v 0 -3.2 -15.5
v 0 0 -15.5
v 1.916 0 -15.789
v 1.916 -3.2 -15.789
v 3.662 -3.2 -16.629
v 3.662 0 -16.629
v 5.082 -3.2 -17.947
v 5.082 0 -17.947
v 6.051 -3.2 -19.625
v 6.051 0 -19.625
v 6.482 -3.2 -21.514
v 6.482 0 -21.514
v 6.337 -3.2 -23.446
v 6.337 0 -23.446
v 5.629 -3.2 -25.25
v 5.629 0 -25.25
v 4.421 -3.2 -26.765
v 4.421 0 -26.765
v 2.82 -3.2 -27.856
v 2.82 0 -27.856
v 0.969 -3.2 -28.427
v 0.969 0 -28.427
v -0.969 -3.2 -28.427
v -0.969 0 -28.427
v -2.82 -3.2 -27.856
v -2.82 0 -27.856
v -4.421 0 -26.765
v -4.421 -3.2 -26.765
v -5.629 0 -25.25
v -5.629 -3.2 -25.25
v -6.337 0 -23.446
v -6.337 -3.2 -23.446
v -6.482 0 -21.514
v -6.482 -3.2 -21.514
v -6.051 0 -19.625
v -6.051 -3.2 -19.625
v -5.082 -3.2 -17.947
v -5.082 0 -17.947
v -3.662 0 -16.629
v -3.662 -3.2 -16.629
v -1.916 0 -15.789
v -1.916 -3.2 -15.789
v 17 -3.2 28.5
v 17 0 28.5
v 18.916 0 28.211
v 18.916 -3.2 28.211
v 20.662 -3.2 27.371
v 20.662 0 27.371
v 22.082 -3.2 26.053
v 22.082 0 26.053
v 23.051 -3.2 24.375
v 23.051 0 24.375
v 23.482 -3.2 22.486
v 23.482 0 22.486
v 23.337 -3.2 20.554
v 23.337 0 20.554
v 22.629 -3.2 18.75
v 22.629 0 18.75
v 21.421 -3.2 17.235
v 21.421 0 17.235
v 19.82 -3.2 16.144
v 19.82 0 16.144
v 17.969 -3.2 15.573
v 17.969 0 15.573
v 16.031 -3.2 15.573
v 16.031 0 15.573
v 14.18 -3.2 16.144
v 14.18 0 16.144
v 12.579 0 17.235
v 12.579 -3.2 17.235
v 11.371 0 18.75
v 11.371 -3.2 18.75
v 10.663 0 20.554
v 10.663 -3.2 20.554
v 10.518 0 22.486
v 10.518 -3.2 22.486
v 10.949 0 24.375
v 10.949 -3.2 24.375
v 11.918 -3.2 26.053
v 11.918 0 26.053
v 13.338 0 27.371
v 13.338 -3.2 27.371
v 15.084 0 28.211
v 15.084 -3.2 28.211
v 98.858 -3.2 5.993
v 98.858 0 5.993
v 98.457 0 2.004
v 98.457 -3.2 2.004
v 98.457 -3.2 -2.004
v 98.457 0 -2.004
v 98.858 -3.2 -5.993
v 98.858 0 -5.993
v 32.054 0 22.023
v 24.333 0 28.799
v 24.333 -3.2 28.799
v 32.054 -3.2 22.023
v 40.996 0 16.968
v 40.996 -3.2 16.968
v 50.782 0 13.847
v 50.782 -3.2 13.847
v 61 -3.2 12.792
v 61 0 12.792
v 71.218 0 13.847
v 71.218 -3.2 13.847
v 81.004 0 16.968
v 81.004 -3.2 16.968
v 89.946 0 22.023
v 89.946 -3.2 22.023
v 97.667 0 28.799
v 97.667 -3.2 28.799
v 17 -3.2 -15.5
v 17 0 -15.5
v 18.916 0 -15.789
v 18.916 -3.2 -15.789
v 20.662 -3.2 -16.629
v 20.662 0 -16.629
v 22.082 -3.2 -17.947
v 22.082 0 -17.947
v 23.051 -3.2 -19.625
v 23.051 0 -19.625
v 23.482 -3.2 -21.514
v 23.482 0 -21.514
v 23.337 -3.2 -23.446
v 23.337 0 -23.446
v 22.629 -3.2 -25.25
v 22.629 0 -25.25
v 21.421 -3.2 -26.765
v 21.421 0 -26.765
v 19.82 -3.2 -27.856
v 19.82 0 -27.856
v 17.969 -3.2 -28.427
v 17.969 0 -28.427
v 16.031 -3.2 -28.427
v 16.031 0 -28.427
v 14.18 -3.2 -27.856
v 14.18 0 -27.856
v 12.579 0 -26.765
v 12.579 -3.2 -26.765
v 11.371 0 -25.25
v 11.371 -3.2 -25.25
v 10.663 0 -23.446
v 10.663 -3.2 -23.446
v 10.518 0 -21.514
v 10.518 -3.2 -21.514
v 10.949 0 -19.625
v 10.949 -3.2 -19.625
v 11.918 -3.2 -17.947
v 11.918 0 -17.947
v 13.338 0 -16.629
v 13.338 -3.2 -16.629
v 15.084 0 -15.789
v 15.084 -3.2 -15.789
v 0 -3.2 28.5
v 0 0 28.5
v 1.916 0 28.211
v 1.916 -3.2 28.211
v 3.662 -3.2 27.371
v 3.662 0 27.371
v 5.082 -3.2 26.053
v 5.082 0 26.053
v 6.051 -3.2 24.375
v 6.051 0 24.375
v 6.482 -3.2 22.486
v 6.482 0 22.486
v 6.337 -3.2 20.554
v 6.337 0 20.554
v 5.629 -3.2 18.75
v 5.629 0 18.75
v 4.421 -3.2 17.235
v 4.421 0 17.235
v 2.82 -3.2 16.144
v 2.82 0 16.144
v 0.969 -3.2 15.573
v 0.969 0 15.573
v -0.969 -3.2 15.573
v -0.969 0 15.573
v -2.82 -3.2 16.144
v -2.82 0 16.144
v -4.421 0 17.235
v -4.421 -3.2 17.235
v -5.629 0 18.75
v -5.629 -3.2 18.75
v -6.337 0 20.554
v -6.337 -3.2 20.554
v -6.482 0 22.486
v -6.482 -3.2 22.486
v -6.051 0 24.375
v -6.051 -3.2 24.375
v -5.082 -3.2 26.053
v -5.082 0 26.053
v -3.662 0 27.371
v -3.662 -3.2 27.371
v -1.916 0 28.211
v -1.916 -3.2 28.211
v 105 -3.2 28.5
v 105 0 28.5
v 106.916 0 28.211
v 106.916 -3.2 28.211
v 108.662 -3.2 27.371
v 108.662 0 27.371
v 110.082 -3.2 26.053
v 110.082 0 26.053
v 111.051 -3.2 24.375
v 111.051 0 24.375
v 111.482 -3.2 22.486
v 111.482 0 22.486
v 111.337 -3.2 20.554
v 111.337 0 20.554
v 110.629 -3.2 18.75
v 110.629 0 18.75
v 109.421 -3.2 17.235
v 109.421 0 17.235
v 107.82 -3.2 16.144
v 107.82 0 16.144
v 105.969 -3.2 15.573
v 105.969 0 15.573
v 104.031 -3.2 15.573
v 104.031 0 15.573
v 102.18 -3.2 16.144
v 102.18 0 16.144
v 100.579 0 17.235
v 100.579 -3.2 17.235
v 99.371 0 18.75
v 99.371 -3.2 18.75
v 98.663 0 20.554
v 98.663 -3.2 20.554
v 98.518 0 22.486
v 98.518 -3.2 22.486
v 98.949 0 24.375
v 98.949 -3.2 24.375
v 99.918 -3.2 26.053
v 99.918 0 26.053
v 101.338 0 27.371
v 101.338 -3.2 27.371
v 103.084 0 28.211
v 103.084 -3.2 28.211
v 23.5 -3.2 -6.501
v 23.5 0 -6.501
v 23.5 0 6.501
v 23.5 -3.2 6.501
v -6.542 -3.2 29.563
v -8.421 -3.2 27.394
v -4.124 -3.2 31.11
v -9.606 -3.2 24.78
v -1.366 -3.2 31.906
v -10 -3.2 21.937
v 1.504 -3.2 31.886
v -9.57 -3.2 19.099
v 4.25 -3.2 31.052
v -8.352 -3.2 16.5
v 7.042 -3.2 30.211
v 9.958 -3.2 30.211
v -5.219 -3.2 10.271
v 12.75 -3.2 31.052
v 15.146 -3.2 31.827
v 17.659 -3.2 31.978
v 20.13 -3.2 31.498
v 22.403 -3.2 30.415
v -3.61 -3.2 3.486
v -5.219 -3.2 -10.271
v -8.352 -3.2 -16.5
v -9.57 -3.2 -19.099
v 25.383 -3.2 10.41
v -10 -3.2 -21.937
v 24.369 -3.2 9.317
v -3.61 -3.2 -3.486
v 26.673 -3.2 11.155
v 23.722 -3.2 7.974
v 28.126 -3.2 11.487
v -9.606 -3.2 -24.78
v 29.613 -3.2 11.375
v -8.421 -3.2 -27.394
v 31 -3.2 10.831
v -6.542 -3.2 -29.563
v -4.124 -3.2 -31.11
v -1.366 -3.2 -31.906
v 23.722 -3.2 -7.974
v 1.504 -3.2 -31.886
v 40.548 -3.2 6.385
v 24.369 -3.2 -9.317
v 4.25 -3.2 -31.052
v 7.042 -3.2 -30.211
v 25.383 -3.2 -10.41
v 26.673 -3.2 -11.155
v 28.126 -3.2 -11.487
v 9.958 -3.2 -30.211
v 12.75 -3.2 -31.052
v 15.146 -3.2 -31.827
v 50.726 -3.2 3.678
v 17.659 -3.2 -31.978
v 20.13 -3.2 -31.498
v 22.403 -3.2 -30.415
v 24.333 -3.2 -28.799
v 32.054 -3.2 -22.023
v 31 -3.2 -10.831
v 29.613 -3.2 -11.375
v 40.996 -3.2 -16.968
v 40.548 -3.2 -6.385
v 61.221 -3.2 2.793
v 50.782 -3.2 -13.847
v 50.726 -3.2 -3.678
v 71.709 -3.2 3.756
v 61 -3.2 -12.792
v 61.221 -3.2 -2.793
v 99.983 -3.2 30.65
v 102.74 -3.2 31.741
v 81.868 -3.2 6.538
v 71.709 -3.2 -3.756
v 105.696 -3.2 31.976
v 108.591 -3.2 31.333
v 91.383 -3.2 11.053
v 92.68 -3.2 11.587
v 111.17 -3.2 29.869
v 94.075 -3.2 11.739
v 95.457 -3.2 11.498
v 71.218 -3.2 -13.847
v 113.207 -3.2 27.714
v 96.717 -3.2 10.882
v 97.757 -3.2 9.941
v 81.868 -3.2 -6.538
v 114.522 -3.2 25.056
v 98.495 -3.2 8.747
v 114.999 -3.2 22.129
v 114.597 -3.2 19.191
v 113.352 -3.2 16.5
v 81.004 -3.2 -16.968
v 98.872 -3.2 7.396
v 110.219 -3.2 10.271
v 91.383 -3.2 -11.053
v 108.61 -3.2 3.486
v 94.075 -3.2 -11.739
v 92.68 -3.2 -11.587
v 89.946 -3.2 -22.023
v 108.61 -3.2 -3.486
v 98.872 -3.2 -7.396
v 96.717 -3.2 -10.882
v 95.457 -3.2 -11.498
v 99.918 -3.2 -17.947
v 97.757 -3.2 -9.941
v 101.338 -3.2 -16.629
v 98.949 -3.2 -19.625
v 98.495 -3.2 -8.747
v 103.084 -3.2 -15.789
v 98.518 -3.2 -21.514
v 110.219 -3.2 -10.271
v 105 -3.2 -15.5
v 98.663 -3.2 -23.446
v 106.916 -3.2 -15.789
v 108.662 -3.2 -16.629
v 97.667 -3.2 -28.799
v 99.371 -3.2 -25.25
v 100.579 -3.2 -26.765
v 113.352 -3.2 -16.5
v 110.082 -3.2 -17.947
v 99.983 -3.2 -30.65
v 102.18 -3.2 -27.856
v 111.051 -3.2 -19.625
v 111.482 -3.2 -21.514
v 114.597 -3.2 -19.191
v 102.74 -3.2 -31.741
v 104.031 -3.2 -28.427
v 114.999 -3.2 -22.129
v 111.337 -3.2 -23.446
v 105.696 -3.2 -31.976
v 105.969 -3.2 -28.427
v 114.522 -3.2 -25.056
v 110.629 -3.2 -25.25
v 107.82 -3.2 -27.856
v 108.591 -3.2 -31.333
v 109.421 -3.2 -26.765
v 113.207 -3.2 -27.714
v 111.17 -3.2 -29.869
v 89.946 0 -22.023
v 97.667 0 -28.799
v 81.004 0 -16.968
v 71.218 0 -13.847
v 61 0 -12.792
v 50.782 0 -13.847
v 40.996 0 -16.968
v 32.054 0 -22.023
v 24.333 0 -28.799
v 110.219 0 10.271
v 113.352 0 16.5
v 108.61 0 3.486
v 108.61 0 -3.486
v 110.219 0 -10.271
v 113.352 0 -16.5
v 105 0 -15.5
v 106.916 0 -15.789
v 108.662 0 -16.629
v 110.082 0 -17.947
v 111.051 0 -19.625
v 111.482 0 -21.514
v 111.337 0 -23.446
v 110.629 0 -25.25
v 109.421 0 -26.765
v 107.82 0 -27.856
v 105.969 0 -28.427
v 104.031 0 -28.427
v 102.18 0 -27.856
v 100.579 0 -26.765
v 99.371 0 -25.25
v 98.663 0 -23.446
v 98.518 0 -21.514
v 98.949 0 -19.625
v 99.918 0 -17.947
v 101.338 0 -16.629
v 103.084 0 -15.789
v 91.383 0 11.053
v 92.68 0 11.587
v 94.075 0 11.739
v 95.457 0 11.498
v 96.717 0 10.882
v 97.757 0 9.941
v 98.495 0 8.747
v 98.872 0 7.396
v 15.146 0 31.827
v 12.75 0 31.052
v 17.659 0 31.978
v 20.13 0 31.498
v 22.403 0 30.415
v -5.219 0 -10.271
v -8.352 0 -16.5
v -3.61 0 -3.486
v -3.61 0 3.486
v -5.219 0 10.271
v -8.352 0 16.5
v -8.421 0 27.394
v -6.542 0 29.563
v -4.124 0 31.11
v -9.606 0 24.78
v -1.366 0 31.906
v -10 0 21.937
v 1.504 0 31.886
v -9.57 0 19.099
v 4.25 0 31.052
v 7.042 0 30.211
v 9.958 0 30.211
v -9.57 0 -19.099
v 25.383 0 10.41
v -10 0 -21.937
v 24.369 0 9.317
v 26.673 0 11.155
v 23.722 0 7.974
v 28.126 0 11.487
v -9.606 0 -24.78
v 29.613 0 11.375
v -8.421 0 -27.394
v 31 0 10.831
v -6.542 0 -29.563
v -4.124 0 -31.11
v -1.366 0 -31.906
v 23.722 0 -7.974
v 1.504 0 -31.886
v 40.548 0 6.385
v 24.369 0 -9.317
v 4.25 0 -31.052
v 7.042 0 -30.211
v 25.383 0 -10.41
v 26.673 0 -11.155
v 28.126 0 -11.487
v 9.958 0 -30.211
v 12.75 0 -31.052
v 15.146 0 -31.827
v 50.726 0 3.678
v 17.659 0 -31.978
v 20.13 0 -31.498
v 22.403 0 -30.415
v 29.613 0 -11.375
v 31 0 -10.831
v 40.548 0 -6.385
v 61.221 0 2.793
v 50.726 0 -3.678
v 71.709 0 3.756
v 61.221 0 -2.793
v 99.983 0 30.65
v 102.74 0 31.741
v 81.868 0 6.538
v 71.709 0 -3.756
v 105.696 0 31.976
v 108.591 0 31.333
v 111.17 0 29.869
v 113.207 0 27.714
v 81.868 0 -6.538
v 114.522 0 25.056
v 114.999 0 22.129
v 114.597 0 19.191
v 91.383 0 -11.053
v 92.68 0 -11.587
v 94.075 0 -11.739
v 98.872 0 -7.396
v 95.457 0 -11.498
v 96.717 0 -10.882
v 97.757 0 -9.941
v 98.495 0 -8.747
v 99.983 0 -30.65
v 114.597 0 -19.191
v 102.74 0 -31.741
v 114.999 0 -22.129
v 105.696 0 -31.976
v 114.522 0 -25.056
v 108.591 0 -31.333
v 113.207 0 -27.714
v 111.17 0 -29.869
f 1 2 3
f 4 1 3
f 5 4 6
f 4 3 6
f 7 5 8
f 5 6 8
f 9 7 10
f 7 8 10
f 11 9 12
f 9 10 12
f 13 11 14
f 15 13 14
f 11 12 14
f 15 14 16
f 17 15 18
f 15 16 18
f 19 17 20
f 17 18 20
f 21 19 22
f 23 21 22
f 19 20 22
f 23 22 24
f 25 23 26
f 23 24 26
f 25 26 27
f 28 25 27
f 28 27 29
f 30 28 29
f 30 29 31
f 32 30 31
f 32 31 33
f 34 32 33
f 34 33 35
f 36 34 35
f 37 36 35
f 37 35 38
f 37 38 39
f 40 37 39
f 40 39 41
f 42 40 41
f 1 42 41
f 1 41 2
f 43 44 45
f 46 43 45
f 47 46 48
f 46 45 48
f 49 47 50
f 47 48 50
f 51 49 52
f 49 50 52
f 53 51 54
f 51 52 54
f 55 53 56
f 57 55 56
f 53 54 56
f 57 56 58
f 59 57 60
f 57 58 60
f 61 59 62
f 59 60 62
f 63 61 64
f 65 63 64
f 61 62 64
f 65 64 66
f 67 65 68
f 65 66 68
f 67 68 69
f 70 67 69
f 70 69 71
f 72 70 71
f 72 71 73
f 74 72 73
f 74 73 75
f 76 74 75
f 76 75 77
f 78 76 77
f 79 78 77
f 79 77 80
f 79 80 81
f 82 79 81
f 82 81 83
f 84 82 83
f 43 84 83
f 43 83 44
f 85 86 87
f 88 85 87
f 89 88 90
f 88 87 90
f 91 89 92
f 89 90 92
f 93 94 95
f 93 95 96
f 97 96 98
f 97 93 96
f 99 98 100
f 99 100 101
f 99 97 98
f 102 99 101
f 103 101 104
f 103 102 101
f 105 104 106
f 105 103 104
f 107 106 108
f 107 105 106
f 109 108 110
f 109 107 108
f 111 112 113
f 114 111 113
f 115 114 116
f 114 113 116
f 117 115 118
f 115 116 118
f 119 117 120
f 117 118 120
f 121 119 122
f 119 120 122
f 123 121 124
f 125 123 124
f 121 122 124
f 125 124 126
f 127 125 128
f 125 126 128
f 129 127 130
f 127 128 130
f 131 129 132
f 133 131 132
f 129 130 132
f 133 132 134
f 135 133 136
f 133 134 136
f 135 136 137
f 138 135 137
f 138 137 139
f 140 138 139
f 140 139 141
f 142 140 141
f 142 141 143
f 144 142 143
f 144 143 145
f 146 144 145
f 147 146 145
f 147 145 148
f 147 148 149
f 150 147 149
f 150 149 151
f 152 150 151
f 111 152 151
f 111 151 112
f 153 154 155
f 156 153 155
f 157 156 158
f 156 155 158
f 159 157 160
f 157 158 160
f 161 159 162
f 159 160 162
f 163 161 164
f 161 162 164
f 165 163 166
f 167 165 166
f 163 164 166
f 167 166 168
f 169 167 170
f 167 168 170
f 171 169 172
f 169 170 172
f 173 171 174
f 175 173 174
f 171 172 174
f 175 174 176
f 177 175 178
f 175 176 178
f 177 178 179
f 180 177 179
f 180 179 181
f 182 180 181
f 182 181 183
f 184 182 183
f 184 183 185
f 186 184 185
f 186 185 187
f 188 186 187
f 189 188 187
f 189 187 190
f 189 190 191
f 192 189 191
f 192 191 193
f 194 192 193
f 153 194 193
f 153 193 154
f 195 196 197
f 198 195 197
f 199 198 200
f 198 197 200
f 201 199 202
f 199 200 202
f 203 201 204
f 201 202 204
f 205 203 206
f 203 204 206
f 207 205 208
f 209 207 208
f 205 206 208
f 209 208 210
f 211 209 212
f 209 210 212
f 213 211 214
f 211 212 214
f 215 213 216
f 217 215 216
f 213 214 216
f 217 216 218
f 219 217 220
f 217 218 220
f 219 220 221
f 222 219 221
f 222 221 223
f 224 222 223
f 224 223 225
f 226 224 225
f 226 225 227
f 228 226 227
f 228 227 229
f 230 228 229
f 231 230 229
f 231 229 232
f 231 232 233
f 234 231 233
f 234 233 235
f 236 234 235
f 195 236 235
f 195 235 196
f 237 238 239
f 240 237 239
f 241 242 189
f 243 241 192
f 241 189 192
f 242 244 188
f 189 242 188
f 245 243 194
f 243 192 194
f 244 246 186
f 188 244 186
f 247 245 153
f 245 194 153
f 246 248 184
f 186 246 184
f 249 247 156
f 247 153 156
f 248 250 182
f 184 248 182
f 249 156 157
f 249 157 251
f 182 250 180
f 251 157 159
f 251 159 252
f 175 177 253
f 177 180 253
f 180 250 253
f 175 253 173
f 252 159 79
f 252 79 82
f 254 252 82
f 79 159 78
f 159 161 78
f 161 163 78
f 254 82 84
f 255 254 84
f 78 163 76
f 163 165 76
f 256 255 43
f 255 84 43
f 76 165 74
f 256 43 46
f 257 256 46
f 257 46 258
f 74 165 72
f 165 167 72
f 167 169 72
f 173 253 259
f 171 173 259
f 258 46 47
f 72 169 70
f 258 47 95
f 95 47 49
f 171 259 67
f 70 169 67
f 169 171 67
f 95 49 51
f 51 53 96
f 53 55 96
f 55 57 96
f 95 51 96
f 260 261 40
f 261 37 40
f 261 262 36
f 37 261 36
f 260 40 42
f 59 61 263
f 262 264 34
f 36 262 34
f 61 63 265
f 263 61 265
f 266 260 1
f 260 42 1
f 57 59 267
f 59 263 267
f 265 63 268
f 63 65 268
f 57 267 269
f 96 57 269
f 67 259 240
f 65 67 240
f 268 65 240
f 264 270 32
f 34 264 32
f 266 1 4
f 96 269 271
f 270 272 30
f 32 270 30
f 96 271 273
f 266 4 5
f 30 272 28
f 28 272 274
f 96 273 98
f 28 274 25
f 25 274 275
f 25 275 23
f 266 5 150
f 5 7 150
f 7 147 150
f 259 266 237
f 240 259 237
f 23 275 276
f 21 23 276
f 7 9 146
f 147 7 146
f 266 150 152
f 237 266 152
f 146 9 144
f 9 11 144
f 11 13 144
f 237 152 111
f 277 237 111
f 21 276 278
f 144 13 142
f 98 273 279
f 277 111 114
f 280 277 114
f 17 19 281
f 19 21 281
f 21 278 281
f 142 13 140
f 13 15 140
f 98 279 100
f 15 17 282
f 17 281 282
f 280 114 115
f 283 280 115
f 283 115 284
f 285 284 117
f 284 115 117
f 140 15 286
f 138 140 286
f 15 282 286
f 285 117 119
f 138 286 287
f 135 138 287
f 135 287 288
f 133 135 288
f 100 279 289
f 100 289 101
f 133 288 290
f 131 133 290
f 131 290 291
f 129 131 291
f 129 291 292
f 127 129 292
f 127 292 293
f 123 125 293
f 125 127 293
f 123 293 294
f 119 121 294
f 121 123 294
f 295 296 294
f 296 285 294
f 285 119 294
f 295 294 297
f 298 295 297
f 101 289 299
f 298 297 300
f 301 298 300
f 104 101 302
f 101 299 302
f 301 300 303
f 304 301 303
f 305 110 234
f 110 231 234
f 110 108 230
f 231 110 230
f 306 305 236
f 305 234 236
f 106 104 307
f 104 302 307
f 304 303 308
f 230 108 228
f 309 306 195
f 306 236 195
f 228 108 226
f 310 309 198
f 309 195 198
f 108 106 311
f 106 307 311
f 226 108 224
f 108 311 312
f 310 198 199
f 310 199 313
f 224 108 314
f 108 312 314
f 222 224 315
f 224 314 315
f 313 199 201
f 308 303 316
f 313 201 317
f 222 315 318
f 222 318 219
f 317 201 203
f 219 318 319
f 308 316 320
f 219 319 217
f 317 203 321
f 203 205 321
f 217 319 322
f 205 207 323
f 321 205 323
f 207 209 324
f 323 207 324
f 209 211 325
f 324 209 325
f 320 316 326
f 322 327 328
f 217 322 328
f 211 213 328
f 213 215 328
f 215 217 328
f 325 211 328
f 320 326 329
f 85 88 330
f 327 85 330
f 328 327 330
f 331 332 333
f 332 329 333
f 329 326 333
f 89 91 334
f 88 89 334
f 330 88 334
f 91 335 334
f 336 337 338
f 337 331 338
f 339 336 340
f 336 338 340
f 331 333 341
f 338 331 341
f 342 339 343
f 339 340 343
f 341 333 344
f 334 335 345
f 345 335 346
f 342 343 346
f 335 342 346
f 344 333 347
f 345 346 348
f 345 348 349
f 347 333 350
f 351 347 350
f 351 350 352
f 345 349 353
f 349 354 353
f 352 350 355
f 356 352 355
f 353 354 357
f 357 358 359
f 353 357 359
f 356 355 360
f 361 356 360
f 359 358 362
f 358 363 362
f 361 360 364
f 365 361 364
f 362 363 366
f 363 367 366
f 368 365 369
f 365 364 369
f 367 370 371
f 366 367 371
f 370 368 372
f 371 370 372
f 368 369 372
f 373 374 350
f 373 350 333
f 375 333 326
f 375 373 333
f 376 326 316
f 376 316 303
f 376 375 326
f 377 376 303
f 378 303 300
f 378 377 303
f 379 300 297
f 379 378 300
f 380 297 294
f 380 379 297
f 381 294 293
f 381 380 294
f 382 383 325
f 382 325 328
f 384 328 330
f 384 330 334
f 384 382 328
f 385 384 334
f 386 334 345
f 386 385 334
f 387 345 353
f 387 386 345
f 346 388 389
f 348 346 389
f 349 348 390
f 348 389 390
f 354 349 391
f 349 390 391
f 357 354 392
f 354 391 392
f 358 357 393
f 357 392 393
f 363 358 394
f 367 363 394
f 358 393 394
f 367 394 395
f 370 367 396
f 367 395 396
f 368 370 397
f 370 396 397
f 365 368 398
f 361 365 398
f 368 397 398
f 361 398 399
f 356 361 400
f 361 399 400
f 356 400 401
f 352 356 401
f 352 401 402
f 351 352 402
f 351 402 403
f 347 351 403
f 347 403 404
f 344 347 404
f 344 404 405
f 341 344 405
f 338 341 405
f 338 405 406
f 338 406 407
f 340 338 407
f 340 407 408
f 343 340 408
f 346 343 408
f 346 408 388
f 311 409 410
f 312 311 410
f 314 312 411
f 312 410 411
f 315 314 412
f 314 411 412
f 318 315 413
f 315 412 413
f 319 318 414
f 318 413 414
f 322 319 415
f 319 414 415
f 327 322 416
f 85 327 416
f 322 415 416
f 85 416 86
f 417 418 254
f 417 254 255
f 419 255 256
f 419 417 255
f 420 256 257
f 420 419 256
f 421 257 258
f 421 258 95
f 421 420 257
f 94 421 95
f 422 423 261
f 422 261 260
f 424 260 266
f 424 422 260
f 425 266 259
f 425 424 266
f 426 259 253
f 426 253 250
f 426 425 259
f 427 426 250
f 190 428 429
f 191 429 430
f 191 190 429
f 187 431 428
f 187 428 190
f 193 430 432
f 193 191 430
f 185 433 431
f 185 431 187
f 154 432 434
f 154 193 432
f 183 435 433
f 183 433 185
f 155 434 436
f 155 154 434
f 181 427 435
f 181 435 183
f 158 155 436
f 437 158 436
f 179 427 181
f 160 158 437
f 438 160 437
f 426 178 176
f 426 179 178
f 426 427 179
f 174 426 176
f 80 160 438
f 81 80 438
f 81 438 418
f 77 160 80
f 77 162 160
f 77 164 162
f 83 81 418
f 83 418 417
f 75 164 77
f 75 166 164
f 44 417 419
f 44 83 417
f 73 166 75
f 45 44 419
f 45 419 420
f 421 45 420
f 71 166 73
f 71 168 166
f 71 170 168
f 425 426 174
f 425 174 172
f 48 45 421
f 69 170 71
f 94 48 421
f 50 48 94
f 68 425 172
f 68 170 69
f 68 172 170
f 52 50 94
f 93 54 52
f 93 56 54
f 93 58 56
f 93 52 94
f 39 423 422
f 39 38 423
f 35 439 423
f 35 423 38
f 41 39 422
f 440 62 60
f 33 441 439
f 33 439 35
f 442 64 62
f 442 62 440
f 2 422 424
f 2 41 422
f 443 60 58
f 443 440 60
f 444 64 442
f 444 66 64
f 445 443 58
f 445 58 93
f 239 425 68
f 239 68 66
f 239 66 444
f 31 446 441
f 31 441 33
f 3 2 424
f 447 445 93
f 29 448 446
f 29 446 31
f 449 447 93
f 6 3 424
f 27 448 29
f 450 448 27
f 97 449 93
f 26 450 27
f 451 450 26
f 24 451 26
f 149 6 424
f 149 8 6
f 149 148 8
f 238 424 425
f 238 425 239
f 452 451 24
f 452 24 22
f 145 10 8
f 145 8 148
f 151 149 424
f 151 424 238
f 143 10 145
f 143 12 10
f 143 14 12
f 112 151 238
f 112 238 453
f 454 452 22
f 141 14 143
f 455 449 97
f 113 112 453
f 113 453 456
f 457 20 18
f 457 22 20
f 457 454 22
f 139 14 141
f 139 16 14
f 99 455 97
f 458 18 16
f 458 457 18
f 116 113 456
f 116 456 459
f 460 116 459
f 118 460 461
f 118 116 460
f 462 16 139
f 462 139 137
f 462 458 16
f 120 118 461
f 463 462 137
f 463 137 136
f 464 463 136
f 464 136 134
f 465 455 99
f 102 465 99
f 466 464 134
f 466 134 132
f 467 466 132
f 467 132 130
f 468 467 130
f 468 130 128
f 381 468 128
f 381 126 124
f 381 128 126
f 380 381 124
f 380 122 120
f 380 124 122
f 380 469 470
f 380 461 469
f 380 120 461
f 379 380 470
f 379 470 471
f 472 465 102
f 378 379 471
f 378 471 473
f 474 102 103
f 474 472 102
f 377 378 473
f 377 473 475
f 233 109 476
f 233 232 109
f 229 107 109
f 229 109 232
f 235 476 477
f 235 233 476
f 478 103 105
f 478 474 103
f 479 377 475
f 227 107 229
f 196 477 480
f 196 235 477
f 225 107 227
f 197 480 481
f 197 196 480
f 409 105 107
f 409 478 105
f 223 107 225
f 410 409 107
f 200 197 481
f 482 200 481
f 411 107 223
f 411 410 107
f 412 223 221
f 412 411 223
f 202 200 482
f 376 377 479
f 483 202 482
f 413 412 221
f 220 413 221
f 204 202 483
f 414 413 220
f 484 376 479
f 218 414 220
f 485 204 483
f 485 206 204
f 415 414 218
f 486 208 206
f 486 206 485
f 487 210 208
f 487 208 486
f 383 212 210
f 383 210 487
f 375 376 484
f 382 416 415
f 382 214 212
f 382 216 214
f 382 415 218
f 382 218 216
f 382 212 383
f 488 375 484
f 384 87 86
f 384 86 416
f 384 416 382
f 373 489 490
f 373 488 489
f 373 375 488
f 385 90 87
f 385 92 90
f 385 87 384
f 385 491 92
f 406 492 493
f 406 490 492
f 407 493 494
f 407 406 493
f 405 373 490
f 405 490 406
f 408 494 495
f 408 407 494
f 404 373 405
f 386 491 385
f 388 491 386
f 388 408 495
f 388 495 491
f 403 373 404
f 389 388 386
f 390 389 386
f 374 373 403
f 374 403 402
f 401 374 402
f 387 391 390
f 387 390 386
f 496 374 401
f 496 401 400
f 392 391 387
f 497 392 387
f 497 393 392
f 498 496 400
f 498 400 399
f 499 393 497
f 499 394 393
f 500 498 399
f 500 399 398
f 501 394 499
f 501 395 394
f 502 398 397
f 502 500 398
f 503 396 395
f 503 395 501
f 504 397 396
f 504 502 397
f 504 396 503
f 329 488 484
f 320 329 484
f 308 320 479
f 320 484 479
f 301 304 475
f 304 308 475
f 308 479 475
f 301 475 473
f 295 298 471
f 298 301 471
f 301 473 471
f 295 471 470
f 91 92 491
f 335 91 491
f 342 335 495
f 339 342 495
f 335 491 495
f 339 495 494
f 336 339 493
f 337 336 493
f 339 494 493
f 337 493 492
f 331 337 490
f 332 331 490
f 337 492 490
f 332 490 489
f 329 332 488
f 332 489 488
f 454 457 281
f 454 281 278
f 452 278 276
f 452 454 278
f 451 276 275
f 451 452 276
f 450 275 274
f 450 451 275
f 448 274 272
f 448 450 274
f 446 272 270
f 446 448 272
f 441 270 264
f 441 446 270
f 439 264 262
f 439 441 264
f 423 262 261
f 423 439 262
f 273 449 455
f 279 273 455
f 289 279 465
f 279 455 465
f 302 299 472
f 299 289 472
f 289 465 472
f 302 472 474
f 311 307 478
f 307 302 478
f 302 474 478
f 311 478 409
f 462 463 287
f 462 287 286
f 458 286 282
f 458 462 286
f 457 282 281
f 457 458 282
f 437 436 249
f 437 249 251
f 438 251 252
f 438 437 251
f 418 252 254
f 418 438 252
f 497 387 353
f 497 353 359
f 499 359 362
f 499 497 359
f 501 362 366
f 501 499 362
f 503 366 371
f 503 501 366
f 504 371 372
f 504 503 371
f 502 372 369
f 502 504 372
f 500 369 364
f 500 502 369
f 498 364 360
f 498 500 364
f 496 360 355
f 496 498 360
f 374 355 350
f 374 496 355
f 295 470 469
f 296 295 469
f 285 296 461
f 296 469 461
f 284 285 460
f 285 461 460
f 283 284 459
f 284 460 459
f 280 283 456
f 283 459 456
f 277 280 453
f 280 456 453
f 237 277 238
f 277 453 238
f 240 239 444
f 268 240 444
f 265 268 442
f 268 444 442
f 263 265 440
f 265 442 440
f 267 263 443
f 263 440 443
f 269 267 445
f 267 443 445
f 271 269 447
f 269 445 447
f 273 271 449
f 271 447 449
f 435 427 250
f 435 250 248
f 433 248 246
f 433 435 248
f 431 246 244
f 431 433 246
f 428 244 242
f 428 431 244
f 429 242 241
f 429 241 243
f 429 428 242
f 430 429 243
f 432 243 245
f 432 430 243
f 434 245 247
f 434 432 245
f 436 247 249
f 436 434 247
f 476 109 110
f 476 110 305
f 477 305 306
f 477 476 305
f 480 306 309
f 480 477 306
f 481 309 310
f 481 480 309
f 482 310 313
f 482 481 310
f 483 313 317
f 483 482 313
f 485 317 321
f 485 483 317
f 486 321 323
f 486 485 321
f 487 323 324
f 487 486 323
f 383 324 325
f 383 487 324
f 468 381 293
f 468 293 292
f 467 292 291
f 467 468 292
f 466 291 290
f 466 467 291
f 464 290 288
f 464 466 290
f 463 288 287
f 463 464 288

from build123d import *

# Parameters (mm, degrees)
BASE_DEPTH    = 3.2
SKETCH2_R     = 6.5
HOLES_DEPTH   = 120.412059692
CUTAWAY_DEPTH = 120.412059692


with BuildPart() as part:
    # Sketch1 → base (new body)
    with BuildSketch(Plane(origin=(0, 0, 0), x_dir=(1, 0, 0), z_dir=(0, 1, 0))):
        with BuildLine():
            ThreePointArc((4.25, 31.051933495), (-7.559468778, 28.546329643), (-8.351646544, 16.5))
            ThreePointArc((-8.351646544, 16.5), (-3.406586177, 0), (-8.351646544, -16.5))
            ThreePointArc((-8.351646544, -16.5), (-7.559468778, -28.546329643), (4.25, -31.051933495))
            ThreePointArc((4.25, -31.051933495), (8.5, -30.10386699), (12.75, -31.051933495))
            ThreePointArc((12.75, -31.051933495), (18.909452709, -31.816006843), (24.333333333, -28.798692685))
            ThreePointArc((24.333333333, -28.798692685), (61, -12.792156109), (97.666666667, -28.798692685))
            ThreePointArc((97.666666667, -28.798692685), (111.170389039, -29.869326471), (113.351646544, -16.5))
            ThreePointArc((113.351646544, -16.5), (108.406586177, 0), (113.351646544, 16.5))
            ThreePointArc((113.351646544, 16.5), (111.170389039, 29.869326471), (97.666666667, 28.798692685))
            ThreePointArc((97.666666667, 28.798692685), (61, 12.792156109), (24.333333333, 28.798692685))
            ThreePointArc((24.333333333, 28.798692685), (18.909452709, 31.816006843), (12.75, 31.051933495))
            ThreePointArc((12.75, 31.051933495), (8.5, 30.10386699), (4.25, 31.051933495))
        make_face()
    extrude(amount=-BASE_DEPTH)

    # Sketch2 → holes (cut, through all)
    with BuildSketch(Plane(origin=(0, 0, 0), x_dir=(1, 0, 0), z_dir=(0, 1, 0))):
        with Locations(Location((0, 22, 0), (0, 0, 270))):
            Circle(SKETCH2_R)
        with Locations(Location((17, 22, 0), (0, 0, 270))):
            Circle(SKETCH2_R)
        with Locations(Location((105, 22, 0), (0, 0, 270))):
            Circle(SKETCH2_R)
        with Locations(Location((105, -22, 0), (0, 0, 270))):
            Circle(SKETCH2_R)
        with Locations(Location((17, -22, 0), (0, 0, 270))):
            Circle(SKETCH2_R)
        with Locations(Location((0, -22, 0), (0, 0, 270))):
            Circle(SKETCH2_R)
    extrude(amount=-HOLES_DEPTH, mode=Mode.SUBTRACT)

    # Sketch3 → cutaway (cut, through all)
    with BuildSketch(Plane(origin=(0, 0, 0), x_dir=(-1, 0, 0), z_dir=(0, 1, 0))):
        with BuildLine():
            Line((-23.5, -6.500504863), (-23.5, 6.500504863))
            ThreePointArc((-23.5, 6.500504863), (-26, 10.830631882), (-31, 10.830631882))
            ThreePointArc((-31, 10.830631882), (-61.221365673, 2.792564466), (-91.38259727, 11.053410636))
            ThreePointArc((-91.38259727, 11.053410636), (-96.717445945, 10.882305495), (-98.858047687, 5.992754234))
            ThreePointArc((-98.858047687, 5.992754234), (-98.406586177, 0), (-98.858047687, -5.992754234))
            ThreePointArc((-98.858047687, -5.992754234), (-96.717445945, -10.882305495), (-91.38259727, -11.053410636))
            ThreePointArc((-91.38259727, -11.053410636), (-61.221365673, -2.792564466), (-31, -10.830631882))
            ThreePointArc((-31, -10.830631882), (-26, -10.830631882), (-23.5, -6.500504863))
        make_face()
    extrude(amount=-CUTAWAY_DEPTH, mode=Mode.SUBTRACT)


solid = part.part
